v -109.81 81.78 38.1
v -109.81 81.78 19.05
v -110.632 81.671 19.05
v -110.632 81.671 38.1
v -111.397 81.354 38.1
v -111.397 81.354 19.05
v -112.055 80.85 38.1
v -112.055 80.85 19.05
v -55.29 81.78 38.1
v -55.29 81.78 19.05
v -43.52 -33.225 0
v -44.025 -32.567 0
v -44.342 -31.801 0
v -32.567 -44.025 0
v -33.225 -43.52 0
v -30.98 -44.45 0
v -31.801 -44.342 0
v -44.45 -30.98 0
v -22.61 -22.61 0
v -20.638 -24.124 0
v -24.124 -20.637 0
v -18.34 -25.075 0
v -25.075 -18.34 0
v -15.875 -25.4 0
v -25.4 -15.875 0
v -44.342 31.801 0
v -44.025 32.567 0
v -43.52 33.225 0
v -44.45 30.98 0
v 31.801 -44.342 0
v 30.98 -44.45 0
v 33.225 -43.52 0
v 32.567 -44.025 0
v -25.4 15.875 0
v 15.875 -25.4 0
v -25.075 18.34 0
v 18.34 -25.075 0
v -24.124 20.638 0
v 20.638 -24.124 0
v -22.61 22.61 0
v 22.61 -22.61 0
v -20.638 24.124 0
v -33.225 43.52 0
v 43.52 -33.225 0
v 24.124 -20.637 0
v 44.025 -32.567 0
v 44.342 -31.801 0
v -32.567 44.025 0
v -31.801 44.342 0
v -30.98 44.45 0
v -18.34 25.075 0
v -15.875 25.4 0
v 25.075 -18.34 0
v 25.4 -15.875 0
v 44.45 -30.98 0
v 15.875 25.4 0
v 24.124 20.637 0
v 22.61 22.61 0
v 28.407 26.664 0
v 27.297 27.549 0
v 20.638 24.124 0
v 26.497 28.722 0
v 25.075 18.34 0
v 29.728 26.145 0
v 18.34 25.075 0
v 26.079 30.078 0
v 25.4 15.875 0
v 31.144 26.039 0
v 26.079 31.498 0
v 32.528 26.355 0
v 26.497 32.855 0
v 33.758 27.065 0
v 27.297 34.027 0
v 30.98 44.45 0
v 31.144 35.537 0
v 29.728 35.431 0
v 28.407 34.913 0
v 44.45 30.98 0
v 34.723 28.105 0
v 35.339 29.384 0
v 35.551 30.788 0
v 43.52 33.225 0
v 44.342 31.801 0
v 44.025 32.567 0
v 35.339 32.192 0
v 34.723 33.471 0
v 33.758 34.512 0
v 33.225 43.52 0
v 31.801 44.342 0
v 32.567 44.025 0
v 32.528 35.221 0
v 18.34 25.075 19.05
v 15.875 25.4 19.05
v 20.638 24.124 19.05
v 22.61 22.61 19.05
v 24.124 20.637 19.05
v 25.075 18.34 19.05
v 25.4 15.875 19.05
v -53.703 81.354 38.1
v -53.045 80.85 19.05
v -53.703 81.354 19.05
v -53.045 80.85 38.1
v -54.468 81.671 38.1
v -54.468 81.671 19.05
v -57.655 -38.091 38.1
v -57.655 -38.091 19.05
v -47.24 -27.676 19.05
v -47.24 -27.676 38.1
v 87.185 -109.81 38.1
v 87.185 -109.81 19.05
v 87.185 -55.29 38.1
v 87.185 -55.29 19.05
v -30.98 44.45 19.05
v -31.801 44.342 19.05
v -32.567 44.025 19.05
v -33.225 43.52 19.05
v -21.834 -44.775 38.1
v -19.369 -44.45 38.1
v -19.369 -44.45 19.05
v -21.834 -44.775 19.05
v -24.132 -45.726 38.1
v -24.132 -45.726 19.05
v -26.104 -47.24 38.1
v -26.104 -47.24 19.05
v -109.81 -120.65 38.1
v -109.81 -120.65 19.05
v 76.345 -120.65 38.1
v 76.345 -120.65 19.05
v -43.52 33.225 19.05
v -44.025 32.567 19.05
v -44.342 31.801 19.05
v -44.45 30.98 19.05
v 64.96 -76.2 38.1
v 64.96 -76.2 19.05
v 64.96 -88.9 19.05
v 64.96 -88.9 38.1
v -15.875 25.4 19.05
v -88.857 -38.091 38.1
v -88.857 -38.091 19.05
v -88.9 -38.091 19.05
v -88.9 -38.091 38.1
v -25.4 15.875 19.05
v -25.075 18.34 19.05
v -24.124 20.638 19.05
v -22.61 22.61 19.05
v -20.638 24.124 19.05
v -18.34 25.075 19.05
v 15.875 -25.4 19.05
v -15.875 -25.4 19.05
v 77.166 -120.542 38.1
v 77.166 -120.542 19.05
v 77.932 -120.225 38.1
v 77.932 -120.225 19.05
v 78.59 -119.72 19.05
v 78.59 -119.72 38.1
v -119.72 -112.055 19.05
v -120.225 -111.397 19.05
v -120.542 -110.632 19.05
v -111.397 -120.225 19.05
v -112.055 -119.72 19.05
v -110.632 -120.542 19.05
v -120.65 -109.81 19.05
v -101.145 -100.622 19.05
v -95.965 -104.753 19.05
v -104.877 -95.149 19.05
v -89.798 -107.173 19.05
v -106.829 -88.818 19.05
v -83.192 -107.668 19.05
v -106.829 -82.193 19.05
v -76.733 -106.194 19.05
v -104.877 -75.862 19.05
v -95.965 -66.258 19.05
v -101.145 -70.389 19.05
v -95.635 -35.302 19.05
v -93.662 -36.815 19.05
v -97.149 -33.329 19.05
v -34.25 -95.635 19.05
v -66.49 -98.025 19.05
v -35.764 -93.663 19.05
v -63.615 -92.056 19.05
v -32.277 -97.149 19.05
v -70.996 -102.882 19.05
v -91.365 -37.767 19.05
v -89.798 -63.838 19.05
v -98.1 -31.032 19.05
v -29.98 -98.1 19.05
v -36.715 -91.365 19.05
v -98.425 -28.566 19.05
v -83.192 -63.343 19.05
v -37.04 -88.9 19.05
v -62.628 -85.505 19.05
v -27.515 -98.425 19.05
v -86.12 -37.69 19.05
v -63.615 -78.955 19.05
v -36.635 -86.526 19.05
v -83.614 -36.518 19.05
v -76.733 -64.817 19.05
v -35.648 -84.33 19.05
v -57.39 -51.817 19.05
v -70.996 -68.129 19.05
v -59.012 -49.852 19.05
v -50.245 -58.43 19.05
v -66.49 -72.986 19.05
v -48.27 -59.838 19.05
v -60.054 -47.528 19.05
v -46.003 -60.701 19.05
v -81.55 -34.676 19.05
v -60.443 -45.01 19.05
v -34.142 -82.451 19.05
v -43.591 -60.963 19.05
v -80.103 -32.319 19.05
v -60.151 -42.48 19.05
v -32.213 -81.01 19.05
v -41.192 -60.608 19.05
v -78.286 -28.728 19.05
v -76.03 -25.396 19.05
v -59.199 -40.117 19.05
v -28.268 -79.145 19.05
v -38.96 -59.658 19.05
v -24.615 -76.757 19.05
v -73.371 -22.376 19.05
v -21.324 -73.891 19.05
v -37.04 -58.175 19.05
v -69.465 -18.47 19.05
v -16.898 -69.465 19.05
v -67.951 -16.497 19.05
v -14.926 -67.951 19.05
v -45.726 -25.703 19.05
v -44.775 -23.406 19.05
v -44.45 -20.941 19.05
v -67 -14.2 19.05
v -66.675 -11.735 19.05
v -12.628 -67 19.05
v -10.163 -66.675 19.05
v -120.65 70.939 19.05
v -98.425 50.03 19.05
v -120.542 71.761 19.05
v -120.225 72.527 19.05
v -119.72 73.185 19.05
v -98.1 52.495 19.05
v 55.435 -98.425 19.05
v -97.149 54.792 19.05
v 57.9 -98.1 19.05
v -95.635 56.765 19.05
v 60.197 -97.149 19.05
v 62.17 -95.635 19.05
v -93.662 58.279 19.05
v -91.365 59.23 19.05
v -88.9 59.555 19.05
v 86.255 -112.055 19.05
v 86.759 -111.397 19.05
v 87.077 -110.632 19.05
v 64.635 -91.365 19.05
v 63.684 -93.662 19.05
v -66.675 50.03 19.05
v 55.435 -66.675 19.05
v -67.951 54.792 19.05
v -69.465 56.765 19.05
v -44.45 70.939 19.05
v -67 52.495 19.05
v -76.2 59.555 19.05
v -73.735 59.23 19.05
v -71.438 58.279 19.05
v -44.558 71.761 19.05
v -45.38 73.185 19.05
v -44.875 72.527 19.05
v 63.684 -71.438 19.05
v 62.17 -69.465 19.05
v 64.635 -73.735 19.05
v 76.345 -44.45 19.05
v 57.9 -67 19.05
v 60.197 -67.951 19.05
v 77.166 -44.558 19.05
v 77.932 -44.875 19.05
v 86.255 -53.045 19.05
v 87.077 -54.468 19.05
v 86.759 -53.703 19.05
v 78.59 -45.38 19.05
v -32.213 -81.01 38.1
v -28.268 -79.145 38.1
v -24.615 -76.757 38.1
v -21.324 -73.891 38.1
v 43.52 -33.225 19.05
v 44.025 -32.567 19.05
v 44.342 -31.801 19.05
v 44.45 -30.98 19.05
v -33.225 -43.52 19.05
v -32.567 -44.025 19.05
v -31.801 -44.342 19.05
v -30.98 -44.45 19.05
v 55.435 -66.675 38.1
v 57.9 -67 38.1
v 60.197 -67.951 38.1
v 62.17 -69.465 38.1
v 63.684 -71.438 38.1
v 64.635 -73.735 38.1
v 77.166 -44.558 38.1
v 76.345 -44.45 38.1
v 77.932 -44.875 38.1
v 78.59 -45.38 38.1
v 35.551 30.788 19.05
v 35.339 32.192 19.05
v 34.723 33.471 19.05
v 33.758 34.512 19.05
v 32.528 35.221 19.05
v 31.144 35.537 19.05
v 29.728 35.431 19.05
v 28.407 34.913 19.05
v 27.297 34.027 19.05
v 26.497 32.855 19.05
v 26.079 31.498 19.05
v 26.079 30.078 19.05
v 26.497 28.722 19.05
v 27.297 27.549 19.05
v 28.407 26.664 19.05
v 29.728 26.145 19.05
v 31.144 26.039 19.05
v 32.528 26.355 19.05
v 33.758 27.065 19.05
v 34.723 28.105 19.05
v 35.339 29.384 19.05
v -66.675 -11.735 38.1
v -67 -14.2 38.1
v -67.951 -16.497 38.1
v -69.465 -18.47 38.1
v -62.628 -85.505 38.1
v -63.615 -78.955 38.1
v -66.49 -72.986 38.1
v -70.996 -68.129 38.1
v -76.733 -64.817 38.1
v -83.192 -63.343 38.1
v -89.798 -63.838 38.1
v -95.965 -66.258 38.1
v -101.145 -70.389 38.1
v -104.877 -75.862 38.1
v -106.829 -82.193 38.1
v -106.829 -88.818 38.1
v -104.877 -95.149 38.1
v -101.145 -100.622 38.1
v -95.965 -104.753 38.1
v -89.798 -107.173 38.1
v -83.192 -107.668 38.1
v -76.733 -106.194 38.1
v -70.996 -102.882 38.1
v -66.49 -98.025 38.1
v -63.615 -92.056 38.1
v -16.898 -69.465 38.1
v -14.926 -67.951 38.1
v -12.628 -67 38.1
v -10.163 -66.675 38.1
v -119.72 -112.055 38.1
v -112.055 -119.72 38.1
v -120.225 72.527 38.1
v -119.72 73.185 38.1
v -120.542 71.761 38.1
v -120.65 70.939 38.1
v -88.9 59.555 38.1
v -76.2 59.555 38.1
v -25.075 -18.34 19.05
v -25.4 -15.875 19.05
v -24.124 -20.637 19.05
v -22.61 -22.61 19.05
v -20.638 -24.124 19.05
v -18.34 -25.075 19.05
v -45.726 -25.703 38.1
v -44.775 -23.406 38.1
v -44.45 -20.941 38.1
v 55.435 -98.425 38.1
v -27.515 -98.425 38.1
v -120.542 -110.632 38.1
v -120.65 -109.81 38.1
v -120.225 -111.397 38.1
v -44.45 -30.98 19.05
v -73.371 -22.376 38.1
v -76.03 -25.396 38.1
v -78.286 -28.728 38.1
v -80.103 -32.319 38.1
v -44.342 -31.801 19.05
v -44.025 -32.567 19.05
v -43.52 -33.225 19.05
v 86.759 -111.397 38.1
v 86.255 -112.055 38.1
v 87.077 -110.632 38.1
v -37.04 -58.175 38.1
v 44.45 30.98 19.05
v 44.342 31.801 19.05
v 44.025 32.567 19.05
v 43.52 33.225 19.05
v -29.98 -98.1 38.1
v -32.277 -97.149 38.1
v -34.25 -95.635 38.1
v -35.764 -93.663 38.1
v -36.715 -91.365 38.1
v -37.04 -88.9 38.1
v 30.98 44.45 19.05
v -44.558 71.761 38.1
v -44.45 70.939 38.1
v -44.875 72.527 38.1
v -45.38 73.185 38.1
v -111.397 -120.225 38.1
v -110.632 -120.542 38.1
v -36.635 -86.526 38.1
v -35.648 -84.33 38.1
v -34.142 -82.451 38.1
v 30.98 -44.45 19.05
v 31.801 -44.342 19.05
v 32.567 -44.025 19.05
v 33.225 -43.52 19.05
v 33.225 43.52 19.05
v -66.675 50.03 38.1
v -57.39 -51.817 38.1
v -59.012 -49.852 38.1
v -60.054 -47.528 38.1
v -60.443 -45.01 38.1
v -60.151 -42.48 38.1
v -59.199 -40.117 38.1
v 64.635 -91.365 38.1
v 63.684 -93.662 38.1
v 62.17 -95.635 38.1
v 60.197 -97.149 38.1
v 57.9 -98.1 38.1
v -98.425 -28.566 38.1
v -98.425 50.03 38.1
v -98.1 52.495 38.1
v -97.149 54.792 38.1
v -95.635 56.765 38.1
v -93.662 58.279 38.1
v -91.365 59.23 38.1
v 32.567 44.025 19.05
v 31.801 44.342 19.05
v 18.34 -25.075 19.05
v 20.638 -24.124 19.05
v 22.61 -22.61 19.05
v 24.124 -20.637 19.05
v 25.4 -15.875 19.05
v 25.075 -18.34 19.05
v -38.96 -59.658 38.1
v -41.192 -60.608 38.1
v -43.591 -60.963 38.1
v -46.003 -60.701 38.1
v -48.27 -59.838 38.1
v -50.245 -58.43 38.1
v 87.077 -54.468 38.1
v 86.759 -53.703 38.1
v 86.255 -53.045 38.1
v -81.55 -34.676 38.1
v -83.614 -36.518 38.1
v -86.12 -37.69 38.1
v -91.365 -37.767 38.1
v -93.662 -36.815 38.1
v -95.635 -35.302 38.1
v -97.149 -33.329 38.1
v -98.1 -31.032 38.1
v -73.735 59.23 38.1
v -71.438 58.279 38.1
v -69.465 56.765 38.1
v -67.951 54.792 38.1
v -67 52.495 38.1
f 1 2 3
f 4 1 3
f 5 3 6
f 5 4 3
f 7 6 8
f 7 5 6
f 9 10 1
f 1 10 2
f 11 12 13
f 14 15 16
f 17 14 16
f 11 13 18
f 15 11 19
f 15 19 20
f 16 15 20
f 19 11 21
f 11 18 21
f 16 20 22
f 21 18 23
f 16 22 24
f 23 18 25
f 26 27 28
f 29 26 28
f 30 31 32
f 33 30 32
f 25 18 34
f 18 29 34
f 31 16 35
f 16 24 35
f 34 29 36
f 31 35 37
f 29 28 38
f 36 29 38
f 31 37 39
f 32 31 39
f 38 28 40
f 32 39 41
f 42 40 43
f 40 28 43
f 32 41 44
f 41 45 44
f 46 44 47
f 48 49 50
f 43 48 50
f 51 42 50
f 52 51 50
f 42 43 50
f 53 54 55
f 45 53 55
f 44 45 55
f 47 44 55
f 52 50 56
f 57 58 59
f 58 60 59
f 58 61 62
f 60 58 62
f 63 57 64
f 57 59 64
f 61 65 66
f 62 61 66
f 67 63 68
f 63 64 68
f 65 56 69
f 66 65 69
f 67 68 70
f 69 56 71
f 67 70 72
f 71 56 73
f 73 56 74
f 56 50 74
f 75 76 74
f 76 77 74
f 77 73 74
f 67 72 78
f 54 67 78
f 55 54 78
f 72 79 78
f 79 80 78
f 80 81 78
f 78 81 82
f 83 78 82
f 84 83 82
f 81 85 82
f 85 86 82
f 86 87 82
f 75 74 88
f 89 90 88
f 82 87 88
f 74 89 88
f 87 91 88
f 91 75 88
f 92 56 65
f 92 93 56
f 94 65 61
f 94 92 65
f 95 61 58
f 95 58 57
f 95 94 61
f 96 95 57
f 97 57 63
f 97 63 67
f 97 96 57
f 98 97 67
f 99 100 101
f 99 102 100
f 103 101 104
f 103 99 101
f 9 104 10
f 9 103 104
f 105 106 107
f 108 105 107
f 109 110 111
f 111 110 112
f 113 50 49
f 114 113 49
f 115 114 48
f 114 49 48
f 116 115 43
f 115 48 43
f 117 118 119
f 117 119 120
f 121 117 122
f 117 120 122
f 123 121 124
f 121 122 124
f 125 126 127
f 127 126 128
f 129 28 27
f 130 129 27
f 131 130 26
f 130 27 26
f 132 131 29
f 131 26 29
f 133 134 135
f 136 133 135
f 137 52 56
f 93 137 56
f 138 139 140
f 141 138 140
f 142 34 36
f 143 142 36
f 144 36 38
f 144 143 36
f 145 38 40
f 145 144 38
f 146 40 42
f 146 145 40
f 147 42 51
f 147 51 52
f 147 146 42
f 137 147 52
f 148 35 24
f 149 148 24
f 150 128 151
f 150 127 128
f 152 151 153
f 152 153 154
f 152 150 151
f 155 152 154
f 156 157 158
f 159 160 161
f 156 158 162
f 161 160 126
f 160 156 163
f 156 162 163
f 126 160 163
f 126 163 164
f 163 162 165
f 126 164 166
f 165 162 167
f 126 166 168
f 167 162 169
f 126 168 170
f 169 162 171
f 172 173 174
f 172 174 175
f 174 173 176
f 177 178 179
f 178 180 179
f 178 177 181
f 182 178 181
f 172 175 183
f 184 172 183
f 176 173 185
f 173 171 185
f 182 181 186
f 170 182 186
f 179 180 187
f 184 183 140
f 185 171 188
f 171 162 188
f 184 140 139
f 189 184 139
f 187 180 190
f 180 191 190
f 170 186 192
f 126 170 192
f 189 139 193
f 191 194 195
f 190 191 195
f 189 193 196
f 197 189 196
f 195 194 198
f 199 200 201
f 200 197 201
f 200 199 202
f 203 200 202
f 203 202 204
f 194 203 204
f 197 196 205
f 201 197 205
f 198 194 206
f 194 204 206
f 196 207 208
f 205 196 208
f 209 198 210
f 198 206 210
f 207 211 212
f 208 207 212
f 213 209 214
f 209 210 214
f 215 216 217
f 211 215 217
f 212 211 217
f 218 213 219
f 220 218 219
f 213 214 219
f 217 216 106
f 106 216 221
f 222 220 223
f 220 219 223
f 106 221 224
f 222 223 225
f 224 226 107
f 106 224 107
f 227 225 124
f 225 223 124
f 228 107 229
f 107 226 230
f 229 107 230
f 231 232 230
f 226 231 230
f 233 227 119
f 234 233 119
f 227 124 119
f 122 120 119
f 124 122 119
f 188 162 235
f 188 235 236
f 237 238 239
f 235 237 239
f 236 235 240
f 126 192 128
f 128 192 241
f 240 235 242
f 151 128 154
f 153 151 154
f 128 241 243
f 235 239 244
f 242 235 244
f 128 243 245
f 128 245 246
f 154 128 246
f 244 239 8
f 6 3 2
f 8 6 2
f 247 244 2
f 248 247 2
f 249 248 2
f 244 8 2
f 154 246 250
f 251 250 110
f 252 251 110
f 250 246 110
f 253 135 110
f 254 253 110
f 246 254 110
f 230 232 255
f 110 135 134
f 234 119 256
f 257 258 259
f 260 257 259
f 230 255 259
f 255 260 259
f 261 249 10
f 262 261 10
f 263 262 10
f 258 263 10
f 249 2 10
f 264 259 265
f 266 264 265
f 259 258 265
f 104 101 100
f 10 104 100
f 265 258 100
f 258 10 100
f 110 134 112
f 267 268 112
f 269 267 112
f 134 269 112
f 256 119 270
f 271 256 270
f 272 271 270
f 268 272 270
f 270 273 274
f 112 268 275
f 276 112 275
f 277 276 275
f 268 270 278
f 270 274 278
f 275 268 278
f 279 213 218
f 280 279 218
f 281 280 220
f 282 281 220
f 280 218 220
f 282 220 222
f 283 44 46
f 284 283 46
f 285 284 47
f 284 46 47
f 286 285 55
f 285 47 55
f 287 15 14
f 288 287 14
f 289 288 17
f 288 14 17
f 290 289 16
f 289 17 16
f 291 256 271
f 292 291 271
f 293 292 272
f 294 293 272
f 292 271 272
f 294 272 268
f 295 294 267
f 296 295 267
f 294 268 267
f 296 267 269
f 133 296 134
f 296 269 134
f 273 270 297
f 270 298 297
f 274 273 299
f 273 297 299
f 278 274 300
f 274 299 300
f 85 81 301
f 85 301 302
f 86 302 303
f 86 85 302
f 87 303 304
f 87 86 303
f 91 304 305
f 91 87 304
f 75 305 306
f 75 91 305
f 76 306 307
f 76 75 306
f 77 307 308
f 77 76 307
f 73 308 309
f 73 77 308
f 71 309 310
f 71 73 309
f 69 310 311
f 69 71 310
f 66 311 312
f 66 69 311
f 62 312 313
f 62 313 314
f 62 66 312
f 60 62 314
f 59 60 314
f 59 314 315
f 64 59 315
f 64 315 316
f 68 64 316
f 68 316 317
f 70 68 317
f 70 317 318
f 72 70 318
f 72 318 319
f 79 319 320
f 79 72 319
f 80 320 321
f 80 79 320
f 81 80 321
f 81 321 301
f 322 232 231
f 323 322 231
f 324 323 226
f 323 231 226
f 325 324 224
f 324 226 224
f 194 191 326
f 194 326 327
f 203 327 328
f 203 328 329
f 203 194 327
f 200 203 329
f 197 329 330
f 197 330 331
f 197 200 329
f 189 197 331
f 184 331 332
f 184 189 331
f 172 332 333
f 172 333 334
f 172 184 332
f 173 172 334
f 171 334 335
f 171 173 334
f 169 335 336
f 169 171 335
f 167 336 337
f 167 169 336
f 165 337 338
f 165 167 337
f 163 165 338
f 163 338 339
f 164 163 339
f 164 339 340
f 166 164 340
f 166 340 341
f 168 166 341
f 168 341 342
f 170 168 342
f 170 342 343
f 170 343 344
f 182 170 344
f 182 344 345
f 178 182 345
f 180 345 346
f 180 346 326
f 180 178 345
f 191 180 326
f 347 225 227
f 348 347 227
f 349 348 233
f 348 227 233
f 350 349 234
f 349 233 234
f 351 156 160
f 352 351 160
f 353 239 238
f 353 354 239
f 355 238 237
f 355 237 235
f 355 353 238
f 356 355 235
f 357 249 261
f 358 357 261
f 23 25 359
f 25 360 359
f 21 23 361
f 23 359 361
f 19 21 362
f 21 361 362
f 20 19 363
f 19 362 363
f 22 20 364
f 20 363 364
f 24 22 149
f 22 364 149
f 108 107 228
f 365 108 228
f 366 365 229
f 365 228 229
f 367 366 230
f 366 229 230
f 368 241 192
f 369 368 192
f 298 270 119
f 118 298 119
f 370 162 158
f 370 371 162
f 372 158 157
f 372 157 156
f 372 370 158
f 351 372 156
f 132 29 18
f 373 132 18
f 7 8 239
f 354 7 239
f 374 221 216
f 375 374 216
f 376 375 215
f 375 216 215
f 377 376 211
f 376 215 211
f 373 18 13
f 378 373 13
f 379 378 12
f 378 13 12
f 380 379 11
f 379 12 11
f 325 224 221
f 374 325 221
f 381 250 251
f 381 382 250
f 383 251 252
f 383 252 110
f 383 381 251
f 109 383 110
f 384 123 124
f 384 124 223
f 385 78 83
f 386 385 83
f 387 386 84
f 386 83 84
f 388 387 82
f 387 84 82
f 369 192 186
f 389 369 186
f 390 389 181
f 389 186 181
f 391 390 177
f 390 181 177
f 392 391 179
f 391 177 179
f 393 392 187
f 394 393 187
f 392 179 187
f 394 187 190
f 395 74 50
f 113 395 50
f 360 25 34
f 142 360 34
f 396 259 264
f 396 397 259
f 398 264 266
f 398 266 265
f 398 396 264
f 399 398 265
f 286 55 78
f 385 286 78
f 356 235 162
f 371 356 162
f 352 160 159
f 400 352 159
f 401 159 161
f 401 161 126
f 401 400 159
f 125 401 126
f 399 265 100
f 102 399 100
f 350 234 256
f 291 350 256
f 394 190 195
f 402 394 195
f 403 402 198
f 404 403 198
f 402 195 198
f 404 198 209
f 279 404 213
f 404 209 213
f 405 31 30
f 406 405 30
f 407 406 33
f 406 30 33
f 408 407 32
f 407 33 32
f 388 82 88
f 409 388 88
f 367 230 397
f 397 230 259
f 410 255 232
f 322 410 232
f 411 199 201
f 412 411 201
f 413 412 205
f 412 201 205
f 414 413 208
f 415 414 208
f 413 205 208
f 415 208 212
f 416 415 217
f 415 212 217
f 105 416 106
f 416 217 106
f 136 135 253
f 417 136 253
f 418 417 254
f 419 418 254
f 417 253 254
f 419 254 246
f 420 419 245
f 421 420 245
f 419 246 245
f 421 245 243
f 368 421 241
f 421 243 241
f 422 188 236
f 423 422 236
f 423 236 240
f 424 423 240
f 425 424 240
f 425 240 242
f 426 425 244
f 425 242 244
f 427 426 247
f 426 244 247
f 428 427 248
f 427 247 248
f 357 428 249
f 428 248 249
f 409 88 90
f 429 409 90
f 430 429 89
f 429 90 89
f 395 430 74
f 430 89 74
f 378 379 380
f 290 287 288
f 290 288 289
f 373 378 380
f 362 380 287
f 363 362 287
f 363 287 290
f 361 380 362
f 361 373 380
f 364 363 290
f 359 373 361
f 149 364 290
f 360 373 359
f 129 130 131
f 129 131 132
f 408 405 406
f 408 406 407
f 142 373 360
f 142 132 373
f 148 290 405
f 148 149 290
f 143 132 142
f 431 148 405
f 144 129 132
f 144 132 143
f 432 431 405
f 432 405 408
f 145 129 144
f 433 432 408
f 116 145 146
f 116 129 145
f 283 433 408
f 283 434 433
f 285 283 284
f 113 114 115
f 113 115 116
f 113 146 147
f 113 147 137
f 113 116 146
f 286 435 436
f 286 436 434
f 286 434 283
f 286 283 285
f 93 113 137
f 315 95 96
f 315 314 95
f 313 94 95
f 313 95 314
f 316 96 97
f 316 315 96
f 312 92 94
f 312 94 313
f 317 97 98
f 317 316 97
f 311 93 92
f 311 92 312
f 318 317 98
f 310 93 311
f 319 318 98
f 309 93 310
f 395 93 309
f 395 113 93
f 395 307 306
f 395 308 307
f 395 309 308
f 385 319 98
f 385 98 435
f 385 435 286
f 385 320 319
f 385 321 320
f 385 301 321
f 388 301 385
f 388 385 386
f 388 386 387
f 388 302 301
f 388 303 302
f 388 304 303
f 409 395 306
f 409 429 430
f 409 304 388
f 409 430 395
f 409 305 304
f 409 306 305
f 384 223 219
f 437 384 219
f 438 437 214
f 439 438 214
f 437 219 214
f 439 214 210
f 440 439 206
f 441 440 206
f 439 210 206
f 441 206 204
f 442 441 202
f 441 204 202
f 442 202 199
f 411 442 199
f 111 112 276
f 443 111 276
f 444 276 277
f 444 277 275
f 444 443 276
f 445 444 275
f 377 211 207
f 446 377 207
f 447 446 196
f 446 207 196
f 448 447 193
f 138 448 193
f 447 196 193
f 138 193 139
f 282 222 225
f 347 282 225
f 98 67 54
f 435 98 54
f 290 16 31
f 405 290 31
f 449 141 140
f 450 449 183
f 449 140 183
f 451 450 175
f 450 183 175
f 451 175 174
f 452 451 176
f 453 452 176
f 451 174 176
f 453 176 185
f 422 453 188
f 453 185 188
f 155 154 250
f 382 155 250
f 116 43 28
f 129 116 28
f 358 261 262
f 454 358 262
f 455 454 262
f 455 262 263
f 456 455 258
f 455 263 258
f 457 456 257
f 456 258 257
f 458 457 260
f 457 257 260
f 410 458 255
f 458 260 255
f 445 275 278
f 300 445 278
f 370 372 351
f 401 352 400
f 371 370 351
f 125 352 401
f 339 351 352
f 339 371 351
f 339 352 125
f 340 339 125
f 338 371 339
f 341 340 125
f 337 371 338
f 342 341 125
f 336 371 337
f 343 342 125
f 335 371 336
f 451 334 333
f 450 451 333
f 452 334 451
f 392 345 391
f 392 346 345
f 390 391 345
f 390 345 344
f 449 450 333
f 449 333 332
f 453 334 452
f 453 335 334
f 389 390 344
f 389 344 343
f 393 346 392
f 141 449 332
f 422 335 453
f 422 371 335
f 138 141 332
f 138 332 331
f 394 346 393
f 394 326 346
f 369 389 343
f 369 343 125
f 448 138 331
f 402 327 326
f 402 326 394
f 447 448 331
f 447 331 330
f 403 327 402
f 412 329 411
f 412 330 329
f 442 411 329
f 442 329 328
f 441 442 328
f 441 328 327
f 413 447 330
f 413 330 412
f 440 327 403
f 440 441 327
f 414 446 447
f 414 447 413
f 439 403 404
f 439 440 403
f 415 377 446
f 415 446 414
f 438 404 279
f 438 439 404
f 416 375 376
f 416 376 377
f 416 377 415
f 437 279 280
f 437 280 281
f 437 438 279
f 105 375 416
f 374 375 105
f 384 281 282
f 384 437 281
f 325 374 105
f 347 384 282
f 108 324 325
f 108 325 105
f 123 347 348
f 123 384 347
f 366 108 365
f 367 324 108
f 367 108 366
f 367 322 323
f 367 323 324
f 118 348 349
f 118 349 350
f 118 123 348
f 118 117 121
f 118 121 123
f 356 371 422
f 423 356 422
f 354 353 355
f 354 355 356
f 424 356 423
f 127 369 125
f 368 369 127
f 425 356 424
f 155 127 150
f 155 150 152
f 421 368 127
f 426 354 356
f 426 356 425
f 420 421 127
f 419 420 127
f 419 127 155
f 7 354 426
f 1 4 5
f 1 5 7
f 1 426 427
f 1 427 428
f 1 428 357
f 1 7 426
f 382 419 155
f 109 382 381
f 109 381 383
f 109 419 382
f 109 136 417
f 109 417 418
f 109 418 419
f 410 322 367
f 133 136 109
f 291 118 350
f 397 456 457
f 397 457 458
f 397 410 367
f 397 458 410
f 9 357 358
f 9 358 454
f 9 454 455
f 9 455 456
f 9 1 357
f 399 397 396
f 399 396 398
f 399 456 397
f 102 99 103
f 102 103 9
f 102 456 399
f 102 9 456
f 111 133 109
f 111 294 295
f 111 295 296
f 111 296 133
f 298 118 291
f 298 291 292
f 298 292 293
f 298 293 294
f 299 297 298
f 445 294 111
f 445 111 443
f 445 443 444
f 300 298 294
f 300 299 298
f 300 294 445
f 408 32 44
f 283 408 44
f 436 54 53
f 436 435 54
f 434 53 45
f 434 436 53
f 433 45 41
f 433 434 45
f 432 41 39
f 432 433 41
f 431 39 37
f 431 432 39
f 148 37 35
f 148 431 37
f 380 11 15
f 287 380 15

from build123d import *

# Parameters (mm, degrees)
F0_R     = 4.7625
F1_DEPTH = 19.05
F2_R     = 9.525
F3_R     = 22.225
F4_DEPTH = 19.05
F5_R     = 3.175


with BuildPart() as f1:
    # F0 (on Top) → F1 (new body)
    with BuildSketch(Plane.XY):
        with BuildLine():
            ThreePointArc((-33.22468, -43.520064), (-32.194636, -44.208318), (-30.979616, -44.45))
            Line((-30.979616, -44.45), (0, -44.45))
            Line((0, -44.45), (0, -25.4))
            Line((0, -25.4), (-25.4, -25.4))
            Line((-25.4, -25.4), (-25.4, 0))
            Line((-25.4, 0), (-44.45, 0))
            Line((-44.45, 0), (-44.45, -30.979616))
            ThreePointArc((-44.45, -30.979616), (-44.208318, -32.194636), (-43.520064, -33.22468))
            Line((-43.520064, -33.22468), (-33.22468, -43.520064))
        make_face()
        with BuildLine():
            Line((-44.45, 0), (-25.4, 0))
            Line((-25.4, 0), (-25.4, 25.4))
            Line((-25.4, 25.4), (0, 25.4))
            Line((0, 25.4), (0, 44.45))
            Line((0, 44.45), (-30.979616, 44.45))
            ThreePointArc((-30.979616, 44.45), (-32.194636, 44.208318), (-33.22468, 43.520064))
            Line((-33.22468, 43.520064), (-43.520064, 33.22468))
            ThreePointArc((-43.520064, 33.22468), (-44.208318, 32.194636), (-44.45, 30.979616))
            Line((-44.45, 30.979616), (-44.45, 0))
        make_face()
        with BuildLine():
            Line((25.4, 25.4), (25.4, 0))
            Line((25.4, 0), (44.45, 0))
            Line((44.45, 0), (44.45, 30.979616))
            ThreePointArc((44.45, 30.979616), (44.208318, 32.194636), (43.520064, 33.22468))
            Line((43.520064, 33.22468), (33.22468, 43.520064))
            ThreePointArc((33.22468, 43.520064), (32.194636, 44.208318), (30.979616, 44.45))
            Line((30.979616, 44.45), (0, 44.45))
            Line((0, 44.45), (0, 25.4))
            Line((0, 25.4), (25.4, 25.4))
        make_face()
        with Locations((30.788154, 30.788154)):
            Circle(F0_R, mode=Mode.SUBTRACT)
        with BuildLine():
            Line((0, -25.4), (0, -44.45))
            Line((0, -44.45), (30.979616, -44.45))
            ThreePointArc((30.979616, -44.45), (32.194636, -44.208318), (33.22468, -43.520064))
            Line((33.22468, -43.520064), (43.520064, -33.22468))
            ThreePointArc((43.520064, -33.22468), (44.208318, -32.194636), (44.45, -30.979616))
            Line((44.45, -30.979616), (44.45, 0))
            Line((44.45, 0), (25.4, 0))
            Line((25.4, 0), (25.4, -25.4))
            Line((25.4, -25.4), (0, -25.4))
        make_face()
    extrude(amount=F1_DEPTH)

    # F2
    f2_edges = [f1.edges().sort_by_distance(p)[0] for p in [
        (-25.4, 25.4, 9.525),
        (25.4, 25.4, 9.525),
        (25.4, -25.4, 9.525),
        (-25.4, -25.4, 9.525),
    ]]
    fillet(f2_edges, radius=F2_R)


with BuildPart() as f4:
    # F3 (on face) → F4 (new body)
    with BuildSketch(Plane.XY.offset(19.05)):
        with BuildLine():
            Line((-44.45, -20.940728), (-44.45, 30.979616))
            Line((-44.45, 30.979616), (-44.45, 72.254616))
            Line((-44.45, 72.254616), (-53.975, 81.779616))
            Line((-53.975, 81.779616), (-111.125, 81.779616))
            Line((-111.125, 81.779616), (-120.65, 72.254616))
            Line((-120.65, 72.254616), (-120.65, 30.979616))
            Line((-120.65, 30.979616), (-120.65, -111.125))
            Line((-120.65, -111.125), (-111.125, -120.65))
            Line((-111.125, -120.65), (30.979616, -120.65))
            Line((30.979616, -120.65), (77.659737, -120.65))
            Line((77.659737, -120.65), (87.184737, -111.125))
            Line((87.184737, -111.125), (87.184737, -53.975))
            Line((87.184737, -53.975), (77.659737, -44.45))
            Line((77.659737, -44.45), (30.979616, -44.45))
            Line((30.979616, -44.45), (21.454616, -44.45))
            Line((21.454616, -44.45), (-19.369104, -44.45))
            ThreePointArc((-19.369104, -44.45), (-23.014163, -45.175047), (-26.104296, -47.239808))
            Line((-26.104296, -47.239808), (-37.039934, -58.175447))
            ThreePointArc((-37.039934, -58.175447), (-43.591323, -60.963481), (-50.245414, -58.430319))
            Line((-50.245414, -58.430319), (-57.390378, -51.816651))
            ThreePointArc((-57.390378, -51.816651), (-60.443317, -45.010389), (-57.655282, -38.091394))
            Line((-57.655282, -38.091394), (-47.239808, -27.67592))
            ThreePointArc((-47.239808, -27.67592), (-45.175047, -24.585787), (-44.45, -20.940728))
        make_face()
        with Locations((-84.852698, -85.505492)):
            Circle(F3_R, mode=Mode.SUBTRACT)
        with BuildLine():
            Line((21.454616, -66.675), (30.979616, -66.675))
            Line((30.979616, -66.675), (55.434737, -66.675))
            ThreePointArc((55.434737, -66.675), (62.169929, -69.464808), (64.959737, -76.2))
            Line((64.959737, -76.2), (64.959737, -88.9))
            ThreePointArc((64.959737, -88.9), (62.169929, -95.635192), (55.434737, -98.425))
            Line((55.434737, -98.425), (30.979616, -98.425))
            Line((30.979616, -98.425), (-27.514934, -98.425))
            ThreePointArc((-27.514934, -98.425), (-34.250127, -95.635192), (-37.039934, -88.9))
            ThreePointArc((-37.039934, -88.9), (-35.648431, -84.329884), (-32.213048, -81.010186))
            ThreePointArc((-32.213048, -81.010186), (-26.400221, -78.014211), (-21.324486, -73.890895))
            Line((-21.324486, -73.890895), (-16.898399, -69.464808))
            ThreePointArc((-16.898399, -69.464808), (-13.808267, -67.400047), (-10.163207, -66.675))
            Line((-10.163207, -66.675), (21.454616, -66.675))
        make_face(mode=Mode.SUBTRACT)
        with BuildLine():
            Line((-98.425, 30.979616), (-98.425, 50.029616))
            ThreePointArc((-98.425, 50.029616), (-95.635192, 56.764808), (-88.9, 59.554616))
            Line((-88.9, 59.554616), (-76.2, 59.554616))
            ThreePointArc((-76.2, 59.554616), (-69.464808, 56.764808), (-66.675, 50.029616))
            Line((-66.675, 50.029616), (-66.675, 30.979616))
            Line((-66.675, 30.979616), (-66.675, -11.734831))
            ThreePointArc((-66.675, -11.734831), (-67.400047, -15.379891), (-69.464808, -18.470023))
            Line((-69.464808, -18.470023), (-73.37073, -22.375946))
            ThreePointArc((-73.37073, -22.375946), (-77.21095, -27.026215), (-80.102558, -32.318746))
            ThreePointArc((-80.102558, -32.318746), (-83.613995, -36.518336), (-88.857299, -38.091394))
            Line((-88.857299, -38.091394), (-88.9, -38.091394))
            ThreePointArc((-88.9, -38.091394), (-95.635192, -35.301586), (-98.425, -28.566394))
            Line((-98.425, -28.566394), (-98.425, 30.979616))
        make_face(mode=Mode.SUBTRACT)
    extrude(amount=F4_DEPTH)

    # F5
    f5_edges = [f4.edges().sort_by_distance(p)[0] for p in [
        (-111.125, 81.779616, 28.575),
        (-53.975, 81.779616, 28.575),
        (-44.45, 72.254616, 28.575),
        (77.659737, -44.45, 28.575),
        (87.184737, -53.975, 28.575),
        (87.184737, -111.125, 28.575),
        (77.659737, -120.65, 28.575),
        (-120.65, 72.254616, 28.575),
        (-120.65, -111.125, 28.575),
        (-111.125, -120.65, 28.575),
    ]]
    fillet(f5_edges, radius=F5_R)


solid = Compound([f1.part, f4.part])
